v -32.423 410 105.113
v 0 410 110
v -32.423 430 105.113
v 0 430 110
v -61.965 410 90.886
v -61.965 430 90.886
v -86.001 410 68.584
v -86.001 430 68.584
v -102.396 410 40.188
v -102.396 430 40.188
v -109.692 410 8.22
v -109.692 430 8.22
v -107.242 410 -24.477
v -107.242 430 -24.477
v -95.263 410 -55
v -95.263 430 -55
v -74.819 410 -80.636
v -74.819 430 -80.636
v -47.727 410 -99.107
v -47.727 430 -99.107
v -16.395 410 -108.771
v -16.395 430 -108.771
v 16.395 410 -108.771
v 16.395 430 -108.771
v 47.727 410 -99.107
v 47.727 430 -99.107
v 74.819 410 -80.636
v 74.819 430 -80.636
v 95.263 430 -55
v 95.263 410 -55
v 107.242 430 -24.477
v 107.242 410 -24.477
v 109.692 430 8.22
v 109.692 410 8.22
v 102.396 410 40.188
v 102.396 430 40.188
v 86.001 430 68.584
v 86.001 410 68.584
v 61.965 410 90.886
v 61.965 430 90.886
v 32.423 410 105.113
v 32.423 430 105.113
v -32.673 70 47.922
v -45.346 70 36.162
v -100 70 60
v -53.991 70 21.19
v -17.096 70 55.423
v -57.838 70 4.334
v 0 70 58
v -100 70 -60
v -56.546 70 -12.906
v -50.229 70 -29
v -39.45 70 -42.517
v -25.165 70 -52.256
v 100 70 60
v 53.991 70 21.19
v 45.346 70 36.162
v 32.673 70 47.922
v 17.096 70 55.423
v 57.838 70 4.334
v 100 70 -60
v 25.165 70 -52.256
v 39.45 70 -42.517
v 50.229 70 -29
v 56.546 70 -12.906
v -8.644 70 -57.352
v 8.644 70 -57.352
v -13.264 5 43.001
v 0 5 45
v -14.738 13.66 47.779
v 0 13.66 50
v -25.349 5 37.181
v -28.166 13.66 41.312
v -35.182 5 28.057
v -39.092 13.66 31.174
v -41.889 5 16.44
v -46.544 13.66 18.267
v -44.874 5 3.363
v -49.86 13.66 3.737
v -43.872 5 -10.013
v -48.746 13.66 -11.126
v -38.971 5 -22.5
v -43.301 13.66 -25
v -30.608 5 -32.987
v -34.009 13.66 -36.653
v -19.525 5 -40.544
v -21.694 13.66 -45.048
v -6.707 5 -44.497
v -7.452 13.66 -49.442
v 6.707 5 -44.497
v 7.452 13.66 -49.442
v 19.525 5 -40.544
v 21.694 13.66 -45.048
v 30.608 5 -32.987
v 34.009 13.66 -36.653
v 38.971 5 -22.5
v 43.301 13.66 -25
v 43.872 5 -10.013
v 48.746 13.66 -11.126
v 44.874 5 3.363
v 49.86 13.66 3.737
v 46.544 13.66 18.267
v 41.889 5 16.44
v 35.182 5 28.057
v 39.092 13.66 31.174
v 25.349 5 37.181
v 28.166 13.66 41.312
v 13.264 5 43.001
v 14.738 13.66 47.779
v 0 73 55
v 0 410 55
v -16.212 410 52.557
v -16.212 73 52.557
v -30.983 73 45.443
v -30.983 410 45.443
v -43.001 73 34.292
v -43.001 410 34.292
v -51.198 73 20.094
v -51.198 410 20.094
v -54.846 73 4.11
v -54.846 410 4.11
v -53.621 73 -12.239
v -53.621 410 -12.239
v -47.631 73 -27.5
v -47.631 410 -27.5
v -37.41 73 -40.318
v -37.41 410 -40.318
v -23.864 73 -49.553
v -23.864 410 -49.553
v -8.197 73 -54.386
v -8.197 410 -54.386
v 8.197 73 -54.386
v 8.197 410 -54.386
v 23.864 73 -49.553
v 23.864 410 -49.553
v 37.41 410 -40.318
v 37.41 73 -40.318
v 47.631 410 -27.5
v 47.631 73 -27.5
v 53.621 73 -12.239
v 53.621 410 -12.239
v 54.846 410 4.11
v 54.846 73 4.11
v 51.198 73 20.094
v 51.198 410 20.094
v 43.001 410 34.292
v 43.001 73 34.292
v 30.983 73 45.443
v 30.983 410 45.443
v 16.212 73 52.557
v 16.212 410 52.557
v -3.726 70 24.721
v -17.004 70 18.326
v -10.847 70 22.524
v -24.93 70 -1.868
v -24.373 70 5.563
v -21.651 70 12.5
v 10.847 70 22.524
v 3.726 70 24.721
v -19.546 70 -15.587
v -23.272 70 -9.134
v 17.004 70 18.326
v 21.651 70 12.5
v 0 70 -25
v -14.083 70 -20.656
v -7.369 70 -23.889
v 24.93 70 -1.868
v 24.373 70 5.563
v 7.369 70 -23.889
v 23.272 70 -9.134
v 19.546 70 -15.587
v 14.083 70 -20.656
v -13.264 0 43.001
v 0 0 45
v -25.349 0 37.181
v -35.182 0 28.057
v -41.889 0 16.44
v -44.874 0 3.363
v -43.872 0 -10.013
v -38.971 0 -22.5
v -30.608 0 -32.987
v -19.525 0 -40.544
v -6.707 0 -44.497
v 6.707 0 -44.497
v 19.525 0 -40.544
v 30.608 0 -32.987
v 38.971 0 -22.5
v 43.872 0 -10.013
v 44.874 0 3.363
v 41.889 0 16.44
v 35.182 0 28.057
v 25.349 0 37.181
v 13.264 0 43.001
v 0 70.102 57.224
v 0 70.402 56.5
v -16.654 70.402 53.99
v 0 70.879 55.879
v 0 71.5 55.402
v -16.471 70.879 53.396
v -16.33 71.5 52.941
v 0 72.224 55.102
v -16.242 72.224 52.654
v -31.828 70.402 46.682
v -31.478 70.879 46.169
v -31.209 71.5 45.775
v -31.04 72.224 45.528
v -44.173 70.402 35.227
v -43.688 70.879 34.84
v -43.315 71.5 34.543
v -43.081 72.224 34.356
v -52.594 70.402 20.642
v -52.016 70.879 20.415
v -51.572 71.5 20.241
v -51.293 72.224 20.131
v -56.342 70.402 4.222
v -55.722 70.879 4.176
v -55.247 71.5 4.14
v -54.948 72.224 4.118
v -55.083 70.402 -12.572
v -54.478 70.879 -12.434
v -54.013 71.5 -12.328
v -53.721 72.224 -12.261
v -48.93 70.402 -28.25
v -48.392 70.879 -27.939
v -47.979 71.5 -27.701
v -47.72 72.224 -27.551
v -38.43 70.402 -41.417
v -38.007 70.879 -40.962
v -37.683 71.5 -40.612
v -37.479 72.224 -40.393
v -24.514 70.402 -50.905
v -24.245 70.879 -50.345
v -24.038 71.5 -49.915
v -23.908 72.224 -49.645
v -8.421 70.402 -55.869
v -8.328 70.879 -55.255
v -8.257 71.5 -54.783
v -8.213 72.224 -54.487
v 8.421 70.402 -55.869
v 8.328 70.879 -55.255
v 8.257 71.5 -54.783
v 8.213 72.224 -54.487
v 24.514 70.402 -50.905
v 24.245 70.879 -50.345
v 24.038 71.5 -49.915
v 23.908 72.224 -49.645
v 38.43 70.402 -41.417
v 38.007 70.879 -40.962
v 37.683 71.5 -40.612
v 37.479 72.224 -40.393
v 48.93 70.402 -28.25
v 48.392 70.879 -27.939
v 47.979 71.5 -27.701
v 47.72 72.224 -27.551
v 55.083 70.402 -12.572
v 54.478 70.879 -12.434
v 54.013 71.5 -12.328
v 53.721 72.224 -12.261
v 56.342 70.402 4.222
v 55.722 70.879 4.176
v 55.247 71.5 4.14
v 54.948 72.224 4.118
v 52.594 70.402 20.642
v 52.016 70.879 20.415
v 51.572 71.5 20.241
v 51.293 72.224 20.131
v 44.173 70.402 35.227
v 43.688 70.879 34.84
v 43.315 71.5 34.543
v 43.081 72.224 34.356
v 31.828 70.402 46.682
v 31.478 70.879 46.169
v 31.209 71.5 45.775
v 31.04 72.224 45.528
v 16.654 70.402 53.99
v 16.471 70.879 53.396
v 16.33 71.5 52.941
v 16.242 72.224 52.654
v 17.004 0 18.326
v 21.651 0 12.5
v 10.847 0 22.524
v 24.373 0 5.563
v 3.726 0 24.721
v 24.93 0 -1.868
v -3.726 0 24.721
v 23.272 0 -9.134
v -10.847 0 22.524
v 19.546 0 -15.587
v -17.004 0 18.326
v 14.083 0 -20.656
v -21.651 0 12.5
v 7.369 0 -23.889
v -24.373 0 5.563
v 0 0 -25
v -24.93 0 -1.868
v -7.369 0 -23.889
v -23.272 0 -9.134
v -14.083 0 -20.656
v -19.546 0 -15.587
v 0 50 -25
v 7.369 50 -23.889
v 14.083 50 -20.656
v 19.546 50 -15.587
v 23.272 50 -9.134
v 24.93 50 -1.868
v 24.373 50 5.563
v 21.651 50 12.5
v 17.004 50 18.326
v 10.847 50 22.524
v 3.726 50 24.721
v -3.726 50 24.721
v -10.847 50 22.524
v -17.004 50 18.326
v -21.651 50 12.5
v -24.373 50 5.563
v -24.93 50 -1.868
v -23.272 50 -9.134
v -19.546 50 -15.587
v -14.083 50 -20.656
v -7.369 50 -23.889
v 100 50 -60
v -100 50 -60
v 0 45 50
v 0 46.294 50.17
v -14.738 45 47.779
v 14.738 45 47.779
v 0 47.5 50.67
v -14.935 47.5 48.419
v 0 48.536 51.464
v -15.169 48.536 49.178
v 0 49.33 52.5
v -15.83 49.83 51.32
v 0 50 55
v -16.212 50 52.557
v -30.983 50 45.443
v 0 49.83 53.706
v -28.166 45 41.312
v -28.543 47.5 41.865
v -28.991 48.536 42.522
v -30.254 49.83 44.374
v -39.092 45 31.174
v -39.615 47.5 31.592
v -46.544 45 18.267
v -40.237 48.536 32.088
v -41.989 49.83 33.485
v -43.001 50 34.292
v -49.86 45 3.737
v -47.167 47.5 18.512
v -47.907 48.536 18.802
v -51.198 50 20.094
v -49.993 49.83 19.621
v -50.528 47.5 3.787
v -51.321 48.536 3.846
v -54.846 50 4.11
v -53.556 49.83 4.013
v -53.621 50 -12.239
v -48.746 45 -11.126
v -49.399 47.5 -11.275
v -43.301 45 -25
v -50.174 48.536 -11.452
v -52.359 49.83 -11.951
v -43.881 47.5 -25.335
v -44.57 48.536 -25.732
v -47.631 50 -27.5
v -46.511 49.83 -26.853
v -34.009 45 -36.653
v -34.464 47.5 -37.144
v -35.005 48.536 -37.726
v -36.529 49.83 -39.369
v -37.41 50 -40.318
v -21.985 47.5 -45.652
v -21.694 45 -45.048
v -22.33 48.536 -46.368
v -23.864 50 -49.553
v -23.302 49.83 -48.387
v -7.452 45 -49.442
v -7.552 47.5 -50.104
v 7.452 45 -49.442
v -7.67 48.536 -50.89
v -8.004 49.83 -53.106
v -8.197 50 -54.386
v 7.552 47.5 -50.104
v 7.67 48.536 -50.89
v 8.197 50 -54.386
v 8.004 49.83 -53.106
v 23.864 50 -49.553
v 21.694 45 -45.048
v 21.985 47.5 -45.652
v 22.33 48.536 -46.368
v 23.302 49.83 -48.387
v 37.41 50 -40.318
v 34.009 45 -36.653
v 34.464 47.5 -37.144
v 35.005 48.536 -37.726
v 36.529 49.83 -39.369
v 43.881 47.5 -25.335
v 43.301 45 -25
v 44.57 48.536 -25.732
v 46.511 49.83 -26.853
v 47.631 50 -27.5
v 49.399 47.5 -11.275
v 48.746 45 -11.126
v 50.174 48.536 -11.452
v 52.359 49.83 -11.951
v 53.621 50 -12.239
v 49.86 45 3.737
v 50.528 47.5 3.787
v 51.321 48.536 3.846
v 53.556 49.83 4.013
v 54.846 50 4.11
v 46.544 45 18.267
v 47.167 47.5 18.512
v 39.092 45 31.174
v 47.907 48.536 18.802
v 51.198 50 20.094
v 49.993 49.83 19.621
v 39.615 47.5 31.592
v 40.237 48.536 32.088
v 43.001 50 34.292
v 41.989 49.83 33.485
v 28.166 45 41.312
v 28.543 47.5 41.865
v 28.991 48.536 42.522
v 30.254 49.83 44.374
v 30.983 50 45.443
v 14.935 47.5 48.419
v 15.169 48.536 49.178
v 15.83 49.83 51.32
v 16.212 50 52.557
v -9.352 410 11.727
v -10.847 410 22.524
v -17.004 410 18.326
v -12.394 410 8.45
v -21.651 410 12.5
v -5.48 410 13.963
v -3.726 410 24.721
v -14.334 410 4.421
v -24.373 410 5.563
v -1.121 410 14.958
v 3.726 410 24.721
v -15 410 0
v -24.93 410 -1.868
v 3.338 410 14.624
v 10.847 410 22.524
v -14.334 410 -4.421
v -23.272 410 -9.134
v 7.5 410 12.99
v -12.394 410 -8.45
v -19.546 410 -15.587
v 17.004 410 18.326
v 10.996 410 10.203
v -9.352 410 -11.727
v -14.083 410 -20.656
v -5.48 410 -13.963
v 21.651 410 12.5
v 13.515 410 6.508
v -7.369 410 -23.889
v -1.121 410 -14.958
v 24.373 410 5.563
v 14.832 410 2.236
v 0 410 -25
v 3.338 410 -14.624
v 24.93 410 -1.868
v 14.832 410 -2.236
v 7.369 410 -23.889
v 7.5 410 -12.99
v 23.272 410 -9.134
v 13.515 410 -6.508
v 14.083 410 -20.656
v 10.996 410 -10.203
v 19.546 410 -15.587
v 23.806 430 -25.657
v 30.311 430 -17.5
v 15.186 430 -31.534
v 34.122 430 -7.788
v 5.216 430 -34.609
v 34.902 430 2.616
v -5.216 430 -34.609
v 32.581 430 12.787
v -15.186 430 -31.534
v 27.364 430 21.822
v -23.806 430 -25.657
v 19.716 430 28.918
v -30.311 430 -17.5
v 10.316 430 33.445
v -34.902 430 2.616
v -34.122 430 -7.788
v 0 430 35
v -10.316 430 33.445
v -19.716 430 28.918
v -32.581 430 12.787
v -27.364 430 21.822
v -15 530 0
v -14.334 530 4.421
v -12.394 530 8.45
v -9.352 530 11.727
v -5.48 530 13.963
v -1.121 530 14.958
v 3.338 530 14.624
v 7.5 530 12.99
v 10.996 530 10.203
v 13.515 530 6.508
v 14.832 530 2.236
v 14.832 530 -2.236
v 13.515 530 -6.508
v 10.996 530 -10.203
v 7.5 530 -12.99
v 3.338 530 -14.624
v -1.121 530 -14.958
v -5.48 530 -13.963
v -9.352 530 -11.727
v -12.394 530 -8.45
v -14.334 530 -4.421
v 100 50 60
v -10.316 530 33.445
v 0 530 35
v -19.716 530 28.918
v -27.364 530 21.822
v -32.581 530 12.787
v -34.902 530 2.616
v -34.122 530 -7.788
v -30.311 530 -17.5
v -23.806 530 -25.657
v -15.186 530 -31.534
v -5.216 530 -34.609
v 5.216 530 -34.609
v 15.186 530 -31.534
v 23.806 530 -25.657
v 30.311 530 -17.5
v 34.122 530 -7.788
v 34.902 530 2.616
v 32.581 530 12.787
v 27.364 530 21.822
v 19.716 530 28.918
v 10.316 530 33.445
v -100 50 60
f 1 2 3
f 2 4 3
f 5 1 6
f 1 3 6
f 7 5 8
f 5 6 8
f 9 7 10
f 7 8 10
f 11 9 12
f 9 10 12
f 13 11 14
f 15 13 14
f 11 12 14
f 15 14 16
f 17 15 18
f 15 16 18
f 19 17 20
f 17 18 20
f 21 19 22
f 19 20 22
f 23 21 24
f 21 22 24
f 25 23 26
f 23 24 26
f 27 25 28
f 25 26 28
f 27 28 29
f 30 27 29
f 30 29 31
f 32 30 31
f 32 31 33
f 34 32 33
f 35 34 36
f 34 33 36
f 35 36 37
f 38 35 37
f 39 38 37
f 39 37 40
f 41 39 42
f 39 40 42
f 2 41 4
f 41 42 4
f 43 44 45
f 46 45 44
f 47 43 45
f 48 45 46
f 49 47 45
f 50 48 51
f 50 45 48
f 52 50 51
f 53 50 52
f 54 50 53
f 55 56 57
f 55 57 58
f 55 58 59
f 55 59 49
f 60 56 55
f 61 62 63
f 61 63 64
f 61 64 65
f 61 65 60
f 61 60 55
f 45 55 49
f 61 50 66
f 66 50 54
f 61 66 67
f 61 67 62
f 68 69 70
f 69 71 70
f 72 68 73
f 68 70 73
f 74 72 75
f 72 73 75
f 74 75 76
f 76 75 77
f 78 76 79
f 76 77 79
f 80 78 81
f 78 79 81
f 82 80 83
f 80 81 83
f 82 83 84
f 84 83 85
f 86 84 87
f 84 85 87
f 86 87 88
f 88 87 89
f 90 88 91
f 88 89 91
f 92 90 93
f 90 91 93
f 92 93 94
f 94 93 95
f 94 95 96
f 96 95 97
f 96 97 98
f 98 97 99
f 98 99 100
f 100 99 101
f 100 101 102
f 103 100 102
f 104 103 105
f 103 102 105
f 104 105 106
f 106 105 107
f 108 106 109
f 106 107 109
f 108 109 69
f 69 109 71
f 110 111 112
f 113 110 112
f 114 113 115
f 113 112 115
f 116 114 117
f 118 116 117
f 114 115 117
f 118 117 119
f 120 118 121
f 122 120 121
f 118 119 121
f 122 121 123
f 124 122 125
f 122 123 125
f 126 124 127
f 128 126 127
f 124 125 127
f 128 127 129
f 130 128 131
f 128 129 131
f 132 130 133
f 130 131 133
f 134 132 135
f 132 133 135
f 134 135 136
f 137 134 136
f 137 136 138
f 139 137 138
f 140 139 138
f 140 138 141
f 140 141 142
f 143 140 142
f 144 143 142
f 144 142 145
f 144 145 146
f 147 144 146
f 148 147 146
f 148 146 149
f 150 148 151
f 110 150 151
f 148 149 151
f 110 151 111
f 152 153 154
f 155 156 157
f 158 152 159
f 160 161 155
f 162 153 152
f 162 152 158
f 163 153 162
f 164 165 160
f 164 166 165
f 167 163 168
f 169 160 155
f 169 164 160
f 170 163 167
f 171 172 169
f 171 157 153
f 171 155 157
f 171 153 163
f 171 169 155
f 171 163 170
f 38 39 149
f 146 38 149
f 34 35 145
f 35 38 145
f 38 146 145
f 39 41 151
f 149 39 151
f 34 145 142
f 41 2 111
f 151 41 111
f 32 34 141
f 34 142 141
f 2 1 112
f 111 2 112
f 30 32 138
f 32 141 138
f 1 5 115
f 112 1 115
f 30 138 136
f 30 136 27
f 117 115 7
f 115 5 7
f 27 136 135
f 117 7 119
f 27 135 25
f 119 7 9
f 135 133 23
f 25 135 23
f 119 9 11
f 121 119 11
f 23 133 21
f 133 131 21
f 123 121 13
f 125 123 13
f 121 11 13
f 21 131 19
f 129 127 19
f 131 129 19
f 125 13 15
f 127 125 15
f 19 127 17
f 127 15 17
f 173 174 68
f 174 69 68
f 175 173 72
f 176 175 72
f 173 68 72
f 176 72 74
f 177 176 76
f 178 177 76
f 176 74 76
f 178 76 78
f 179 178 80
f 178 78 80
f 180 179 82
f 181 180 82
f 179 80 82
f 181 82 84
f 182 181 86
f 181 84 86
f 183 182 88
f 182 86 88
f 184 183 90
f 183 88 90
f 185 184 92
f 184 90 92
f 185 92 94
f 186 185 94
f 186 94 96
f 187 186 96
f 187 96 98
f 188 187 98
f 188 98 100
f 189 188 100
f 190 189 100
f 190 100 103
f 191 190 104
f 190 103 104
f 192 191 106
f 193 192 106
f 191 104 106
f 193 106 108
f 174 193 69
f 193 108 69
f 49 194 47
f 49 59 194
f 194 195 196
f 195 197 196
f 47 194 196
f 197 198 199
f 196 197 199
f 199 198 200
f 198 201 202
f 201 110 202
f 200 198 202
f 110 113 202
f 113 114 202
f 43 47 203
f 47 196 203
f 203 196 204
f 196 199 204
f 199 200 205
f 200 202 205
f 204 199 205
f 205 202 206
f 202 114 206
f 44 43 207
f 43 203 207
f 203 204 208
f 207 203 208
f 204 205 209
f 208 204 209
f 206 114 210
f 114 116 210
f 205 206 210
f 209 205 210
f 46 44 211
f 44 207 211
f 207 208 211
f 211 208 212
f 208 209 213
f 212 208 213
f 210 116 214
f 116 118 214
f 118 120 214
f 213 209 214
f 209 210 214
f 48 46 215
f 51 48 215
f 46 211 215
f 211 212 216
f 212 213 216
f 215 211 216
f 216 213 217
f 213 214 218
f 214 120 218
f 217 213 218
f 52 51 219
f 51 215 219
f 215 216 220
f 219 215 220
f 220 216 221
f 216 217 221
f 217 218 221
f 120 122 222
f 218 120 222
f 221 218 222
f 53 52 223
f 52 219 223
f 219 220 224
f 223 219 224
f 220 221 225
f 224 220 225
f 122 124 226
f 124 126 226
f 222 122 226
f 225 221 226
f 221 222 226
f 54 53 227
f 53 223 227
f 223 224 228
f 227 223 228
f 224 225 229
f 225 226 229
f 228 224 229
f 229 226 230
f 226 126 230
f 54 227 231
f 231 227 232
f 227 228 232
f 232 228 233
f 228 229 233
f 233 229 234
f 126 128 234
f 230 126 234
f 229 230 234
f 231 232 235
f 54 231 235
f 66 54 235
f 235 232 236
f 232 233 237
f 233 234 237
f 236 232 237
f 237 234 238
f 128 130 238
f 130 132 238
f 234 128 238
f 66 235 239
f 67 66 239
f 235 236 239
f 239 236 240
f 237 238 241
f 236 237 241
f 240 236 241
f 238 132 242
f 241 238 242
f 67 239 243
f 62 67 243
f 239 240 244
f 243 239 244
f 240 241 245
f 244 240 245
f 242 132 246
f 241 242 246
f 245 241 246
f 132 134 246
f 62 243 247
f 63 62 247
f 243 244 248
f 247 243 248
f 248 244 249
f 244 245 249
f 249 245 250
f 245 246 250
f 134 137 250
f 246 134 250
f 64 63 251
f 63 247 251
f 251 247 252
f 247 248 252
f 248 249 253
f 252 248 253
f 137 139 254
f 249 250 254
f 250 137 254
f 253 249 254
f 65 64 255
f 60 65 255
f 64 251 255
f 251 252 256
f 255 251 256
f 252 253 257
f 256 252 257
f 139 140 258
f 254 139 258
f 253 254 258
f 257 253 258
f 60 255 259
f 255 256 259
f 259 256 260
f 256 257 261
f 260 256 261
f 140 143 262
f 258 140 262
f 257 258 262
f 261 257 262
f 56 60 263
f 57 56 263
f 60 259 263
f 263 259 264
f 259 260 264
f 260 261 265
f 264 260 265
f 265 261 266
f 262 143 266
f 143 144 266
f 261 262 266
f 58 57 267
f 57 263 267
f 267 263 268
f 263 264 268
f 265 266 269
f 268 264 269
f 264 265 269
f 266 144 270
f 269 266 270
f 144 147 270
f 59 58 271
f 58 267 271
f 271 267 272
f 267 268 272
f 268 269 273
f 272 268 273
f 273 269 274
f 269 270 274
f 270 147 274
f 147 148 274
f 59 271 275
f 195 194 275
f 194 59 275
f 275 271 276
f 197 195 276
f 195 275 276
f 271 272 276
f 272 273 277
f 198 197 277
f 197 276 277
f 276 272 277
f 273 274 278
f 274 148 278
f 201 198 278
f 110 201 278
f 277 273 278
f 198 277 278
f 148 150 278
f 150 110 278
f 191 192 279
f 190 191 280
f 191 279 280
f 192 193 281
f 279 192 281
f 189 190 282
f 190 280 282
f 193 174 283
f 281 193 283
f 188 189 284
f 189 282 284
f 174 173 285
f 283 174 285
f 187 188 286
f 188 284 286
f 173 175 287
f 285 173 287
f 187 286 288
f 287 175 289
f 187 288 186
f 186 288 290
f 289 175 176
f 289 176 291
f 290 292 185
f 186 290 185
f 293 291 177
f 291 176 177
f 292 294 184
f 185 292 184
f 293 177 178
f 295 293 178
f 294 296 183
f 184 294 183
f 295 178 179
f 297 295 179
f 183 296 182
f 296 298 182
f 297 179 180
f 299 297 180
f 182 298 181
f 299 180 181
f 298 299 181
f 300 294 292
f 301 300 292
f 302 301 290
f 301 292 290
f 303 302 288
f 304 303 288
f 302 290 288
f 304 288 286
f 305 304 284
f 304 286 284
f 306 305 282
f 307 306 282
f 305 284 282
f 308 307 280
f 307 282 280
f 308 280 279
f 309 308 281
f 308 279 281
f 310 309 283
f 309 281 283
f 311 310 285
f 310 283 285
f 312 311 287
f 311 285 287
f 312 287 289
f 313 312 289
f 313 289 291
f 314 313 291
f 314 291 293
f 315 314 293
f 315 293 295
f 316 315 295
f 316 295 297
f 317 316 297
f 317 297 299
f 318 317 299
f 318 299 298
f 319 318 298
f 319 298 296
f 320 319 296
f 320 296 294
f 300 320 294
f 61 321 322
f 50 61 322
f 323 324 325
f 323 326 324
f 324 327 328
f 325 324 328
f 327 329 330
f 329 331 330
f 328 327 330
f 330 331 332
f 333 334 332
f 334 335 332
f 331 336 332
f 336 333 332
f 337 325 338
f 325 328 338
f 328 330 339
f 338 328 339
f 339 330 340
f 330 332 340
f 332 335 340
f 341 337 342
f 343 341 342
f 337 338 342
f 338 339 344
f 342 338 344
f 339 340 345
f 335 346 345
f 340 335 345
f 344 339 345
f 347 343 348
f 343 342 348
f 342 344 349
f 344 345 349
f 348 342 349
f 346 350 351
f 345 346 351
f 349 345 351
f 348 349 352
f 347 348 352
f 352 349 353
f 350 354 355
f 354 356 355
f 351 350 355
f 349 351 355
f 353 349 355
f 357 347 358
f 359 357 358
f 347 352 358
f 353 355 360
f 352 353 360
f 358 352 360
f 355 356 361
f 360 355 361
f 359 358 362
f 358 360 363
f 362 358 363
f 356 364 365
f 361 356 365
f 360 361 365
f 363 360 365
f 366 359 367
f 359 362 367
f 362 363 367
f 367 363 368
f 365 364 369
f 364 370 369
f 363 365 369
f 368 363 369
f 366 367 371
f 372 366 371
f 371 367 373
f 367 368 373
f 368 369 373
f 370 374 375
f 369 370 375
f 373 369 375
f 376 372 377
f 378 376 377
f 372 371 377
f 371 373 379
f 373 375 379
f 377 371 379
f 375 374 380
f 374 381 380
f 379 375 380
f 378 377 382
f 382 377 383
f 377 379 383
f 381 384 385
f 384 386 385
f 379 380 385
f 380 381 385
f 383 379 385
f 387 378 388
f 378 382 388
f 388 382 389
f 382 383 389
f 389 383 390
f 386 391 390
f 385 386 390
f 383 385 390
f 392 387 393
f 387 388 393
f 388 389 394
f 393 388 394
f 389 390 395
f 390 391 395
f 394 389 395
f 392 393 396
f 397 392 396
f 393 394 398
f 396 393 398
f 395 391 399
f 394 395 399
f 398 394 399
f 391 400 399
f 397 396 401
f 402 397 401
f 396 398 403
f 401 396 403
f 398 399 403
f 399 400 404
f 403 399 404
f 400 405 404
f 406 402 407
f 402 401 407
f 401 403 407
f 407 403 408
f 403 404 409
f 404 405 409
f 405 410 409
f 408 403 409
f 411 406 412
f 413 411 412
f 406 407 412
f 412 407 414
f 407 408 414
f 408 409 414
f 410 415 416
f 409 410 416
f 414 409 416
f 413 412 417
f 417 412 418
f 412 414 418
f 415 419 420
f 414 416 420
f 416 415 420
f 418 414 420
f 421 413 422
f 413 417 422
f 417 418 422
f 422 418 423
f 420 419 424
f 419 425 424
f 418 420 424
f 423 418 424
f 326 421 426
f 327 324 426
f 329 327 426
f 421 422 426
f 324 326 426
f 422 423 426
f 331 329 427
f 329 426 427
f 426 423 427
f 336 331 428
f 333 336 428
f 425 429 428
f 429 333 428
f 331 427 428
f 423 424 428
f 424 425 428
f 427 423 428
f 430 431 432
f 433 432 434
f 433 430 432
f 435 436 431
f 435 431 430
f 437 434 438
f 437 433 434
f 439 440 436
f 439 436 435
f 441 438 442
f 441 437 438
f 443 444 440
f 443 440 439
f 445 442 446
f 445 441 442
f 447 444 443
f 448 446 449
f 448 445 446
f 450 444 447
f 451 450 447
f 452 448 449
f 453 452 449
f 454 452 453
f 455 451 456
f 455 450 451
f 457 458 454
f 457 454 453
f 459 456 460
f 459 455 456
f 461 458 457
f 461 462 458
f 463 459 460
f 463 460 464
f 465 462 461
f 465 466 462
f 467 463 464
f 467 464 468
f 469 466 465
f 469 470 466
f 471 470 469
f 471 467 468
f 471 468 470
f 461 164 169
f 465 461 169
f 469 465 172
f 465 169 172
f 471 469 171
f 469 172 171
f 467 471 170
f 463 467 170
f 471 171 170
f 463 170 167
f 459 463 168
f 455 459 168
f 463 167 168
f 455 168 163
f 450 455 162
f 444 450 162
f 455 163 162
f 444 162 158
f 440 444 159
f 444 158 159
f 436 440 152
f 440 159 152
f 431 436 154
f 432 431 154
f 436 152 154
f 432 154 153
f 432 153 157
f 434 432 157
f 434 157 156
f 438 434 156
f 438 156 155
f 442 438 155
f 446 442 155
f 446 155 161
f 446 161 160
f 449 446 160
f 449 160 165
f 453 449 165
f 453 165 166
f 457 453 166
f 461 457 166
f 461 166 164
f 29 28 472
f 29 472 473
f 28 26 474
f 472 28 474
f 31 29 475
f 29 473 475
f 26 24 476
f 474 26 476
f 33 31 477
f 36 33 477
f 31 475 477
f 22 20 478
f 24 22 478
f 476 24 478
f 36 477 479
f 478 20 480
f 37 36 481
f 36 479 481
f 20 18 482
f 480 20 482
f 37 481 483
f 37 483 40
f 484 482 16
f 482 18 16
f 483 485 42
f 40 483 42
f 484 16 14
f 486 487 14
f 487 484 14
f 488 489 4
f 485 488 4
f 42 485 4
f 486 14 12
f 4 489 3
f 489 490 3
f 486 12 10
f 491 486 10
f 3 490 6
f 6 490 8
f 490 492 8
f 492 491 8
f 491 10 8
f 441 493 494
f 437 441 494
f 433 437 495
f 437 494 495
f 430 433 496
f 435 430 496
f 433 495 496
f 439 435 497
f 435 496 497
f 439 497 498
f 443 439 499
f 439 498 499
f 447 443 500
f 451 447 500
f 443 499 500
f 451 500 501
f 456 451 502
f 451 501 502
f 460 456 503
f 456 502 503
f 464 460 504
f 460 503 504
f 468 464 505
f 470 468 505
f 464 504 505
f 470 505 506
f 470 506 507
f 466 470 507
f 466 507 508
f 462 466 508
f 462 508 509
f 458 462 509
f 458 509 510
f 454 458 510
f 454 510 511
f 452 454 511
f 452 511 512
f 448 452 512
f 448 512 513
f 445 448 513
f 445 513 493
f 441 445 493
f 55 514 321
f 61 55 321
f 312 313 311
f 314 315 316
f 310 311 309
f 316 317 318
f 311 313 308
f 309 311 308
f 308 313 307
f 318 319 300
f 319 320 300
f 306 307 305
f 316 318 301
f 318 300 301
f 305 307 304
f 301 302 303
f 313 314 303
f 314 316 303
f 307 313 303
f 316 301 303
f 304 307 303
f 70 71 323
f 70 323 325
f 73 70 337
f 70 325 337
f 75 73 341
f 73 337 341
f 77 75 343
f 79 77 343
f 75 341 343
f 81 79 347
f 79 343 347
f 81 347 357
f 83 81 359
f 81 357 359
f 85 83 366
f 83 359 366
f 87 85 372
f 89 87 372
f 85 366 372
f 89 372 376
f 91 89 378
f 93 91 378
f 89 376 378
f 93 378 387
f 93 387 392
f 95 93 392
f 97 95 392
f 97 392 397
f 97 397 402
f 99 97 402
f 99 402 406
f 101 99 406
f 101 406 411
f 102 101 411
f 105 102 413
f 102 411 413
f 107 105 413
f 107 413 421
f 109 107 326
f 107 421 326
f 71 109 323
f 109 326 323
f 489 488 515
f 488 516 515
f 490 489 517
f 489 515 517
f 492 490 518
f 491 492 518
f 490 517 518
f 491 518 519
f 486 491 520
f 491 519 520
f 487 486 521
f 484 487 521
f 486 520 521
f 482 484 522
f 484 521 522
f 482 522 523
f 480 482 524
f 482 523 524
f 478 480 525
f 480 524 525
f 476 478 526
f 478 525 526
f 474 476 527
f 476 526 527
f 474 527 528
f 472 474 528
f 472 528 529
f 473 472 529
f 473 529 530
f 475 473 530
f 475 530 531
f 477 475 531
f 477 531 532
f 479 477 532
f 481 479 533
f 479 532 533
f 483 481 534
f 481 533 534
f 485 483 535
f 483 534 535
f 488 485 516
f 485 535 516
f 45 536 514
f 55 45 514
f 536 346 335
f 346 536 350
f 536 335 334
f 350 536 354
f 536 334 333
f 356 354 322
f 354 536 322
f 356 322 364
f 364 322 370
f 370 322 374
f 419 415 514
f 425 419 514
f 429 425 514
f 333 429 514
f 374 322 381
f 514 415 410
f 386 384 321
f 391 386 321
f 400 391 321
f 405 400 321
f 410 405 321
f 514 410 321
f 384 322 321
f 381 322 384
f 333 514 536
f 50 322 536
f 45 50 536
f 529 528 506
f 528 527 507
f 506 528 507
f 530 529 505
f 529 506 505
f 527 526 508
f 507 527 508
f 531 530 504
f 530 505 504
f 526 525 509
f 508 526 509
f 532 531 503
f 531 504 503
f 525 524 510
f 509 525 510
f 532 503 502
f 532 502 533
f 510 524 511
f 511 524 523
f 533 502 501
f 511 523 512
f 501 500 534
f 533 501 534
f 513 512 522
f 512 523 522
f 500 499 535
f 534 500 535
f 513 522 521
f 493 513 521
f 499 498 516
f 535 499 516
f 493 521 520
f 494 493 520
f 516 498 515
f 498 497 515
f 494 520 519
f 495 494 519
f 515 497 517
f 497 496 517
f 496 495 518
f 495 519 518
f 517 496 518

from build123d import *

# Parameters (mm, degrees)
FILLET1_R           = 3
SKETCH3_R           = 25
CUT_EXTRUDE2_DEPTH  = 410
SKETCH4_R           = 15
CUT_EXTRUDE3_DEPTH  = 150
BOSS_EXTRUDE1_DEPTH = 20


with BuildPart() as part:
    # Sketch1 → Revolve1 (revolve)
    with BuildSketch(Plane.XY, mode=Mode.PRIVATE) as revolve1_sk:
        with BuildLine():
            Line((0, 0), (-45, 0))
            Line((-45, 0), (-45, 5))
            Line((-45, 5), (-50, 13.660254038))
            Line((-50, 13.660254038), (-50, 45))
            ThreePointArc((-50, 45), (-51.464466094, 48.535533906), (-55, 50))
            Line((-55, 50), (-60, 50))
            Line((-60, 50), (-60, 70))
            Line((-60, 70), (-55, 70))
            Line((-55, 70), (-55, 410))
            Line((-55, 410), (-110, 410))
            Line((-110, 410), (-110, 430))
            Line((-110, 430), (-35, 430))
            Line((-35, 430), (-35, 530))
            Line((-35, 530), (0, 530))
            Line((0, 530), (0, 0))
        make_face()
    revolve(revolve1_sk.sketch.rotate(Axis((0, 530, 0), (0, -1, 0)), 270), axis=Axis((0, 530, 0), (0, -1, 0)))

    # Fillet1
    fillet1_edges = [part.edges().sort_by_distance(p)[0] for p in [
        (0, 70, -55),
    ]]
    fillet(fillet1_edges, radius=FILLET1_R)

    # Sketch3 → Cut-Extrude2 (cut)
    with BuildSketch(Plane.XZ):
        with Locations(Location((0, 0, 0), (0, 0, 270))):
            Circle(SKETCH3_R)
    extrude(amount=-CUT_EXTRUDE2_DEPTH, mode=Mode.SUBTRACT)

    # Sketch4 → Cut-Extrude3 (cut)
    with BuildSketch(Plane(origin=(0, 530, 0), x_dir=(1, 0, 0), z_dir=(0, 1, 0))):
        with Locations(Location((0, 0, 0), (0, 0, 180))):
            Circle(SKETCH4_R)
    extrude(amount=-CUT_EXTRUDE3_DEPTH, mode=Mode.SUBTRACT)

    # Sketch6 → Boss-Extrude1 (add)
    with BuildSketch(Plane(origin=(0, 50, 0), x_dir=(1, 0, 0), z_dir=(0, 1, 0))):
        Polygon((0, -60), (100, -60), (100, 60), (-100, 60), (-100, -60), align=None)
    extrude(amount=BOSS_EXTRUDE1_DEPTH)


solid = part.part
